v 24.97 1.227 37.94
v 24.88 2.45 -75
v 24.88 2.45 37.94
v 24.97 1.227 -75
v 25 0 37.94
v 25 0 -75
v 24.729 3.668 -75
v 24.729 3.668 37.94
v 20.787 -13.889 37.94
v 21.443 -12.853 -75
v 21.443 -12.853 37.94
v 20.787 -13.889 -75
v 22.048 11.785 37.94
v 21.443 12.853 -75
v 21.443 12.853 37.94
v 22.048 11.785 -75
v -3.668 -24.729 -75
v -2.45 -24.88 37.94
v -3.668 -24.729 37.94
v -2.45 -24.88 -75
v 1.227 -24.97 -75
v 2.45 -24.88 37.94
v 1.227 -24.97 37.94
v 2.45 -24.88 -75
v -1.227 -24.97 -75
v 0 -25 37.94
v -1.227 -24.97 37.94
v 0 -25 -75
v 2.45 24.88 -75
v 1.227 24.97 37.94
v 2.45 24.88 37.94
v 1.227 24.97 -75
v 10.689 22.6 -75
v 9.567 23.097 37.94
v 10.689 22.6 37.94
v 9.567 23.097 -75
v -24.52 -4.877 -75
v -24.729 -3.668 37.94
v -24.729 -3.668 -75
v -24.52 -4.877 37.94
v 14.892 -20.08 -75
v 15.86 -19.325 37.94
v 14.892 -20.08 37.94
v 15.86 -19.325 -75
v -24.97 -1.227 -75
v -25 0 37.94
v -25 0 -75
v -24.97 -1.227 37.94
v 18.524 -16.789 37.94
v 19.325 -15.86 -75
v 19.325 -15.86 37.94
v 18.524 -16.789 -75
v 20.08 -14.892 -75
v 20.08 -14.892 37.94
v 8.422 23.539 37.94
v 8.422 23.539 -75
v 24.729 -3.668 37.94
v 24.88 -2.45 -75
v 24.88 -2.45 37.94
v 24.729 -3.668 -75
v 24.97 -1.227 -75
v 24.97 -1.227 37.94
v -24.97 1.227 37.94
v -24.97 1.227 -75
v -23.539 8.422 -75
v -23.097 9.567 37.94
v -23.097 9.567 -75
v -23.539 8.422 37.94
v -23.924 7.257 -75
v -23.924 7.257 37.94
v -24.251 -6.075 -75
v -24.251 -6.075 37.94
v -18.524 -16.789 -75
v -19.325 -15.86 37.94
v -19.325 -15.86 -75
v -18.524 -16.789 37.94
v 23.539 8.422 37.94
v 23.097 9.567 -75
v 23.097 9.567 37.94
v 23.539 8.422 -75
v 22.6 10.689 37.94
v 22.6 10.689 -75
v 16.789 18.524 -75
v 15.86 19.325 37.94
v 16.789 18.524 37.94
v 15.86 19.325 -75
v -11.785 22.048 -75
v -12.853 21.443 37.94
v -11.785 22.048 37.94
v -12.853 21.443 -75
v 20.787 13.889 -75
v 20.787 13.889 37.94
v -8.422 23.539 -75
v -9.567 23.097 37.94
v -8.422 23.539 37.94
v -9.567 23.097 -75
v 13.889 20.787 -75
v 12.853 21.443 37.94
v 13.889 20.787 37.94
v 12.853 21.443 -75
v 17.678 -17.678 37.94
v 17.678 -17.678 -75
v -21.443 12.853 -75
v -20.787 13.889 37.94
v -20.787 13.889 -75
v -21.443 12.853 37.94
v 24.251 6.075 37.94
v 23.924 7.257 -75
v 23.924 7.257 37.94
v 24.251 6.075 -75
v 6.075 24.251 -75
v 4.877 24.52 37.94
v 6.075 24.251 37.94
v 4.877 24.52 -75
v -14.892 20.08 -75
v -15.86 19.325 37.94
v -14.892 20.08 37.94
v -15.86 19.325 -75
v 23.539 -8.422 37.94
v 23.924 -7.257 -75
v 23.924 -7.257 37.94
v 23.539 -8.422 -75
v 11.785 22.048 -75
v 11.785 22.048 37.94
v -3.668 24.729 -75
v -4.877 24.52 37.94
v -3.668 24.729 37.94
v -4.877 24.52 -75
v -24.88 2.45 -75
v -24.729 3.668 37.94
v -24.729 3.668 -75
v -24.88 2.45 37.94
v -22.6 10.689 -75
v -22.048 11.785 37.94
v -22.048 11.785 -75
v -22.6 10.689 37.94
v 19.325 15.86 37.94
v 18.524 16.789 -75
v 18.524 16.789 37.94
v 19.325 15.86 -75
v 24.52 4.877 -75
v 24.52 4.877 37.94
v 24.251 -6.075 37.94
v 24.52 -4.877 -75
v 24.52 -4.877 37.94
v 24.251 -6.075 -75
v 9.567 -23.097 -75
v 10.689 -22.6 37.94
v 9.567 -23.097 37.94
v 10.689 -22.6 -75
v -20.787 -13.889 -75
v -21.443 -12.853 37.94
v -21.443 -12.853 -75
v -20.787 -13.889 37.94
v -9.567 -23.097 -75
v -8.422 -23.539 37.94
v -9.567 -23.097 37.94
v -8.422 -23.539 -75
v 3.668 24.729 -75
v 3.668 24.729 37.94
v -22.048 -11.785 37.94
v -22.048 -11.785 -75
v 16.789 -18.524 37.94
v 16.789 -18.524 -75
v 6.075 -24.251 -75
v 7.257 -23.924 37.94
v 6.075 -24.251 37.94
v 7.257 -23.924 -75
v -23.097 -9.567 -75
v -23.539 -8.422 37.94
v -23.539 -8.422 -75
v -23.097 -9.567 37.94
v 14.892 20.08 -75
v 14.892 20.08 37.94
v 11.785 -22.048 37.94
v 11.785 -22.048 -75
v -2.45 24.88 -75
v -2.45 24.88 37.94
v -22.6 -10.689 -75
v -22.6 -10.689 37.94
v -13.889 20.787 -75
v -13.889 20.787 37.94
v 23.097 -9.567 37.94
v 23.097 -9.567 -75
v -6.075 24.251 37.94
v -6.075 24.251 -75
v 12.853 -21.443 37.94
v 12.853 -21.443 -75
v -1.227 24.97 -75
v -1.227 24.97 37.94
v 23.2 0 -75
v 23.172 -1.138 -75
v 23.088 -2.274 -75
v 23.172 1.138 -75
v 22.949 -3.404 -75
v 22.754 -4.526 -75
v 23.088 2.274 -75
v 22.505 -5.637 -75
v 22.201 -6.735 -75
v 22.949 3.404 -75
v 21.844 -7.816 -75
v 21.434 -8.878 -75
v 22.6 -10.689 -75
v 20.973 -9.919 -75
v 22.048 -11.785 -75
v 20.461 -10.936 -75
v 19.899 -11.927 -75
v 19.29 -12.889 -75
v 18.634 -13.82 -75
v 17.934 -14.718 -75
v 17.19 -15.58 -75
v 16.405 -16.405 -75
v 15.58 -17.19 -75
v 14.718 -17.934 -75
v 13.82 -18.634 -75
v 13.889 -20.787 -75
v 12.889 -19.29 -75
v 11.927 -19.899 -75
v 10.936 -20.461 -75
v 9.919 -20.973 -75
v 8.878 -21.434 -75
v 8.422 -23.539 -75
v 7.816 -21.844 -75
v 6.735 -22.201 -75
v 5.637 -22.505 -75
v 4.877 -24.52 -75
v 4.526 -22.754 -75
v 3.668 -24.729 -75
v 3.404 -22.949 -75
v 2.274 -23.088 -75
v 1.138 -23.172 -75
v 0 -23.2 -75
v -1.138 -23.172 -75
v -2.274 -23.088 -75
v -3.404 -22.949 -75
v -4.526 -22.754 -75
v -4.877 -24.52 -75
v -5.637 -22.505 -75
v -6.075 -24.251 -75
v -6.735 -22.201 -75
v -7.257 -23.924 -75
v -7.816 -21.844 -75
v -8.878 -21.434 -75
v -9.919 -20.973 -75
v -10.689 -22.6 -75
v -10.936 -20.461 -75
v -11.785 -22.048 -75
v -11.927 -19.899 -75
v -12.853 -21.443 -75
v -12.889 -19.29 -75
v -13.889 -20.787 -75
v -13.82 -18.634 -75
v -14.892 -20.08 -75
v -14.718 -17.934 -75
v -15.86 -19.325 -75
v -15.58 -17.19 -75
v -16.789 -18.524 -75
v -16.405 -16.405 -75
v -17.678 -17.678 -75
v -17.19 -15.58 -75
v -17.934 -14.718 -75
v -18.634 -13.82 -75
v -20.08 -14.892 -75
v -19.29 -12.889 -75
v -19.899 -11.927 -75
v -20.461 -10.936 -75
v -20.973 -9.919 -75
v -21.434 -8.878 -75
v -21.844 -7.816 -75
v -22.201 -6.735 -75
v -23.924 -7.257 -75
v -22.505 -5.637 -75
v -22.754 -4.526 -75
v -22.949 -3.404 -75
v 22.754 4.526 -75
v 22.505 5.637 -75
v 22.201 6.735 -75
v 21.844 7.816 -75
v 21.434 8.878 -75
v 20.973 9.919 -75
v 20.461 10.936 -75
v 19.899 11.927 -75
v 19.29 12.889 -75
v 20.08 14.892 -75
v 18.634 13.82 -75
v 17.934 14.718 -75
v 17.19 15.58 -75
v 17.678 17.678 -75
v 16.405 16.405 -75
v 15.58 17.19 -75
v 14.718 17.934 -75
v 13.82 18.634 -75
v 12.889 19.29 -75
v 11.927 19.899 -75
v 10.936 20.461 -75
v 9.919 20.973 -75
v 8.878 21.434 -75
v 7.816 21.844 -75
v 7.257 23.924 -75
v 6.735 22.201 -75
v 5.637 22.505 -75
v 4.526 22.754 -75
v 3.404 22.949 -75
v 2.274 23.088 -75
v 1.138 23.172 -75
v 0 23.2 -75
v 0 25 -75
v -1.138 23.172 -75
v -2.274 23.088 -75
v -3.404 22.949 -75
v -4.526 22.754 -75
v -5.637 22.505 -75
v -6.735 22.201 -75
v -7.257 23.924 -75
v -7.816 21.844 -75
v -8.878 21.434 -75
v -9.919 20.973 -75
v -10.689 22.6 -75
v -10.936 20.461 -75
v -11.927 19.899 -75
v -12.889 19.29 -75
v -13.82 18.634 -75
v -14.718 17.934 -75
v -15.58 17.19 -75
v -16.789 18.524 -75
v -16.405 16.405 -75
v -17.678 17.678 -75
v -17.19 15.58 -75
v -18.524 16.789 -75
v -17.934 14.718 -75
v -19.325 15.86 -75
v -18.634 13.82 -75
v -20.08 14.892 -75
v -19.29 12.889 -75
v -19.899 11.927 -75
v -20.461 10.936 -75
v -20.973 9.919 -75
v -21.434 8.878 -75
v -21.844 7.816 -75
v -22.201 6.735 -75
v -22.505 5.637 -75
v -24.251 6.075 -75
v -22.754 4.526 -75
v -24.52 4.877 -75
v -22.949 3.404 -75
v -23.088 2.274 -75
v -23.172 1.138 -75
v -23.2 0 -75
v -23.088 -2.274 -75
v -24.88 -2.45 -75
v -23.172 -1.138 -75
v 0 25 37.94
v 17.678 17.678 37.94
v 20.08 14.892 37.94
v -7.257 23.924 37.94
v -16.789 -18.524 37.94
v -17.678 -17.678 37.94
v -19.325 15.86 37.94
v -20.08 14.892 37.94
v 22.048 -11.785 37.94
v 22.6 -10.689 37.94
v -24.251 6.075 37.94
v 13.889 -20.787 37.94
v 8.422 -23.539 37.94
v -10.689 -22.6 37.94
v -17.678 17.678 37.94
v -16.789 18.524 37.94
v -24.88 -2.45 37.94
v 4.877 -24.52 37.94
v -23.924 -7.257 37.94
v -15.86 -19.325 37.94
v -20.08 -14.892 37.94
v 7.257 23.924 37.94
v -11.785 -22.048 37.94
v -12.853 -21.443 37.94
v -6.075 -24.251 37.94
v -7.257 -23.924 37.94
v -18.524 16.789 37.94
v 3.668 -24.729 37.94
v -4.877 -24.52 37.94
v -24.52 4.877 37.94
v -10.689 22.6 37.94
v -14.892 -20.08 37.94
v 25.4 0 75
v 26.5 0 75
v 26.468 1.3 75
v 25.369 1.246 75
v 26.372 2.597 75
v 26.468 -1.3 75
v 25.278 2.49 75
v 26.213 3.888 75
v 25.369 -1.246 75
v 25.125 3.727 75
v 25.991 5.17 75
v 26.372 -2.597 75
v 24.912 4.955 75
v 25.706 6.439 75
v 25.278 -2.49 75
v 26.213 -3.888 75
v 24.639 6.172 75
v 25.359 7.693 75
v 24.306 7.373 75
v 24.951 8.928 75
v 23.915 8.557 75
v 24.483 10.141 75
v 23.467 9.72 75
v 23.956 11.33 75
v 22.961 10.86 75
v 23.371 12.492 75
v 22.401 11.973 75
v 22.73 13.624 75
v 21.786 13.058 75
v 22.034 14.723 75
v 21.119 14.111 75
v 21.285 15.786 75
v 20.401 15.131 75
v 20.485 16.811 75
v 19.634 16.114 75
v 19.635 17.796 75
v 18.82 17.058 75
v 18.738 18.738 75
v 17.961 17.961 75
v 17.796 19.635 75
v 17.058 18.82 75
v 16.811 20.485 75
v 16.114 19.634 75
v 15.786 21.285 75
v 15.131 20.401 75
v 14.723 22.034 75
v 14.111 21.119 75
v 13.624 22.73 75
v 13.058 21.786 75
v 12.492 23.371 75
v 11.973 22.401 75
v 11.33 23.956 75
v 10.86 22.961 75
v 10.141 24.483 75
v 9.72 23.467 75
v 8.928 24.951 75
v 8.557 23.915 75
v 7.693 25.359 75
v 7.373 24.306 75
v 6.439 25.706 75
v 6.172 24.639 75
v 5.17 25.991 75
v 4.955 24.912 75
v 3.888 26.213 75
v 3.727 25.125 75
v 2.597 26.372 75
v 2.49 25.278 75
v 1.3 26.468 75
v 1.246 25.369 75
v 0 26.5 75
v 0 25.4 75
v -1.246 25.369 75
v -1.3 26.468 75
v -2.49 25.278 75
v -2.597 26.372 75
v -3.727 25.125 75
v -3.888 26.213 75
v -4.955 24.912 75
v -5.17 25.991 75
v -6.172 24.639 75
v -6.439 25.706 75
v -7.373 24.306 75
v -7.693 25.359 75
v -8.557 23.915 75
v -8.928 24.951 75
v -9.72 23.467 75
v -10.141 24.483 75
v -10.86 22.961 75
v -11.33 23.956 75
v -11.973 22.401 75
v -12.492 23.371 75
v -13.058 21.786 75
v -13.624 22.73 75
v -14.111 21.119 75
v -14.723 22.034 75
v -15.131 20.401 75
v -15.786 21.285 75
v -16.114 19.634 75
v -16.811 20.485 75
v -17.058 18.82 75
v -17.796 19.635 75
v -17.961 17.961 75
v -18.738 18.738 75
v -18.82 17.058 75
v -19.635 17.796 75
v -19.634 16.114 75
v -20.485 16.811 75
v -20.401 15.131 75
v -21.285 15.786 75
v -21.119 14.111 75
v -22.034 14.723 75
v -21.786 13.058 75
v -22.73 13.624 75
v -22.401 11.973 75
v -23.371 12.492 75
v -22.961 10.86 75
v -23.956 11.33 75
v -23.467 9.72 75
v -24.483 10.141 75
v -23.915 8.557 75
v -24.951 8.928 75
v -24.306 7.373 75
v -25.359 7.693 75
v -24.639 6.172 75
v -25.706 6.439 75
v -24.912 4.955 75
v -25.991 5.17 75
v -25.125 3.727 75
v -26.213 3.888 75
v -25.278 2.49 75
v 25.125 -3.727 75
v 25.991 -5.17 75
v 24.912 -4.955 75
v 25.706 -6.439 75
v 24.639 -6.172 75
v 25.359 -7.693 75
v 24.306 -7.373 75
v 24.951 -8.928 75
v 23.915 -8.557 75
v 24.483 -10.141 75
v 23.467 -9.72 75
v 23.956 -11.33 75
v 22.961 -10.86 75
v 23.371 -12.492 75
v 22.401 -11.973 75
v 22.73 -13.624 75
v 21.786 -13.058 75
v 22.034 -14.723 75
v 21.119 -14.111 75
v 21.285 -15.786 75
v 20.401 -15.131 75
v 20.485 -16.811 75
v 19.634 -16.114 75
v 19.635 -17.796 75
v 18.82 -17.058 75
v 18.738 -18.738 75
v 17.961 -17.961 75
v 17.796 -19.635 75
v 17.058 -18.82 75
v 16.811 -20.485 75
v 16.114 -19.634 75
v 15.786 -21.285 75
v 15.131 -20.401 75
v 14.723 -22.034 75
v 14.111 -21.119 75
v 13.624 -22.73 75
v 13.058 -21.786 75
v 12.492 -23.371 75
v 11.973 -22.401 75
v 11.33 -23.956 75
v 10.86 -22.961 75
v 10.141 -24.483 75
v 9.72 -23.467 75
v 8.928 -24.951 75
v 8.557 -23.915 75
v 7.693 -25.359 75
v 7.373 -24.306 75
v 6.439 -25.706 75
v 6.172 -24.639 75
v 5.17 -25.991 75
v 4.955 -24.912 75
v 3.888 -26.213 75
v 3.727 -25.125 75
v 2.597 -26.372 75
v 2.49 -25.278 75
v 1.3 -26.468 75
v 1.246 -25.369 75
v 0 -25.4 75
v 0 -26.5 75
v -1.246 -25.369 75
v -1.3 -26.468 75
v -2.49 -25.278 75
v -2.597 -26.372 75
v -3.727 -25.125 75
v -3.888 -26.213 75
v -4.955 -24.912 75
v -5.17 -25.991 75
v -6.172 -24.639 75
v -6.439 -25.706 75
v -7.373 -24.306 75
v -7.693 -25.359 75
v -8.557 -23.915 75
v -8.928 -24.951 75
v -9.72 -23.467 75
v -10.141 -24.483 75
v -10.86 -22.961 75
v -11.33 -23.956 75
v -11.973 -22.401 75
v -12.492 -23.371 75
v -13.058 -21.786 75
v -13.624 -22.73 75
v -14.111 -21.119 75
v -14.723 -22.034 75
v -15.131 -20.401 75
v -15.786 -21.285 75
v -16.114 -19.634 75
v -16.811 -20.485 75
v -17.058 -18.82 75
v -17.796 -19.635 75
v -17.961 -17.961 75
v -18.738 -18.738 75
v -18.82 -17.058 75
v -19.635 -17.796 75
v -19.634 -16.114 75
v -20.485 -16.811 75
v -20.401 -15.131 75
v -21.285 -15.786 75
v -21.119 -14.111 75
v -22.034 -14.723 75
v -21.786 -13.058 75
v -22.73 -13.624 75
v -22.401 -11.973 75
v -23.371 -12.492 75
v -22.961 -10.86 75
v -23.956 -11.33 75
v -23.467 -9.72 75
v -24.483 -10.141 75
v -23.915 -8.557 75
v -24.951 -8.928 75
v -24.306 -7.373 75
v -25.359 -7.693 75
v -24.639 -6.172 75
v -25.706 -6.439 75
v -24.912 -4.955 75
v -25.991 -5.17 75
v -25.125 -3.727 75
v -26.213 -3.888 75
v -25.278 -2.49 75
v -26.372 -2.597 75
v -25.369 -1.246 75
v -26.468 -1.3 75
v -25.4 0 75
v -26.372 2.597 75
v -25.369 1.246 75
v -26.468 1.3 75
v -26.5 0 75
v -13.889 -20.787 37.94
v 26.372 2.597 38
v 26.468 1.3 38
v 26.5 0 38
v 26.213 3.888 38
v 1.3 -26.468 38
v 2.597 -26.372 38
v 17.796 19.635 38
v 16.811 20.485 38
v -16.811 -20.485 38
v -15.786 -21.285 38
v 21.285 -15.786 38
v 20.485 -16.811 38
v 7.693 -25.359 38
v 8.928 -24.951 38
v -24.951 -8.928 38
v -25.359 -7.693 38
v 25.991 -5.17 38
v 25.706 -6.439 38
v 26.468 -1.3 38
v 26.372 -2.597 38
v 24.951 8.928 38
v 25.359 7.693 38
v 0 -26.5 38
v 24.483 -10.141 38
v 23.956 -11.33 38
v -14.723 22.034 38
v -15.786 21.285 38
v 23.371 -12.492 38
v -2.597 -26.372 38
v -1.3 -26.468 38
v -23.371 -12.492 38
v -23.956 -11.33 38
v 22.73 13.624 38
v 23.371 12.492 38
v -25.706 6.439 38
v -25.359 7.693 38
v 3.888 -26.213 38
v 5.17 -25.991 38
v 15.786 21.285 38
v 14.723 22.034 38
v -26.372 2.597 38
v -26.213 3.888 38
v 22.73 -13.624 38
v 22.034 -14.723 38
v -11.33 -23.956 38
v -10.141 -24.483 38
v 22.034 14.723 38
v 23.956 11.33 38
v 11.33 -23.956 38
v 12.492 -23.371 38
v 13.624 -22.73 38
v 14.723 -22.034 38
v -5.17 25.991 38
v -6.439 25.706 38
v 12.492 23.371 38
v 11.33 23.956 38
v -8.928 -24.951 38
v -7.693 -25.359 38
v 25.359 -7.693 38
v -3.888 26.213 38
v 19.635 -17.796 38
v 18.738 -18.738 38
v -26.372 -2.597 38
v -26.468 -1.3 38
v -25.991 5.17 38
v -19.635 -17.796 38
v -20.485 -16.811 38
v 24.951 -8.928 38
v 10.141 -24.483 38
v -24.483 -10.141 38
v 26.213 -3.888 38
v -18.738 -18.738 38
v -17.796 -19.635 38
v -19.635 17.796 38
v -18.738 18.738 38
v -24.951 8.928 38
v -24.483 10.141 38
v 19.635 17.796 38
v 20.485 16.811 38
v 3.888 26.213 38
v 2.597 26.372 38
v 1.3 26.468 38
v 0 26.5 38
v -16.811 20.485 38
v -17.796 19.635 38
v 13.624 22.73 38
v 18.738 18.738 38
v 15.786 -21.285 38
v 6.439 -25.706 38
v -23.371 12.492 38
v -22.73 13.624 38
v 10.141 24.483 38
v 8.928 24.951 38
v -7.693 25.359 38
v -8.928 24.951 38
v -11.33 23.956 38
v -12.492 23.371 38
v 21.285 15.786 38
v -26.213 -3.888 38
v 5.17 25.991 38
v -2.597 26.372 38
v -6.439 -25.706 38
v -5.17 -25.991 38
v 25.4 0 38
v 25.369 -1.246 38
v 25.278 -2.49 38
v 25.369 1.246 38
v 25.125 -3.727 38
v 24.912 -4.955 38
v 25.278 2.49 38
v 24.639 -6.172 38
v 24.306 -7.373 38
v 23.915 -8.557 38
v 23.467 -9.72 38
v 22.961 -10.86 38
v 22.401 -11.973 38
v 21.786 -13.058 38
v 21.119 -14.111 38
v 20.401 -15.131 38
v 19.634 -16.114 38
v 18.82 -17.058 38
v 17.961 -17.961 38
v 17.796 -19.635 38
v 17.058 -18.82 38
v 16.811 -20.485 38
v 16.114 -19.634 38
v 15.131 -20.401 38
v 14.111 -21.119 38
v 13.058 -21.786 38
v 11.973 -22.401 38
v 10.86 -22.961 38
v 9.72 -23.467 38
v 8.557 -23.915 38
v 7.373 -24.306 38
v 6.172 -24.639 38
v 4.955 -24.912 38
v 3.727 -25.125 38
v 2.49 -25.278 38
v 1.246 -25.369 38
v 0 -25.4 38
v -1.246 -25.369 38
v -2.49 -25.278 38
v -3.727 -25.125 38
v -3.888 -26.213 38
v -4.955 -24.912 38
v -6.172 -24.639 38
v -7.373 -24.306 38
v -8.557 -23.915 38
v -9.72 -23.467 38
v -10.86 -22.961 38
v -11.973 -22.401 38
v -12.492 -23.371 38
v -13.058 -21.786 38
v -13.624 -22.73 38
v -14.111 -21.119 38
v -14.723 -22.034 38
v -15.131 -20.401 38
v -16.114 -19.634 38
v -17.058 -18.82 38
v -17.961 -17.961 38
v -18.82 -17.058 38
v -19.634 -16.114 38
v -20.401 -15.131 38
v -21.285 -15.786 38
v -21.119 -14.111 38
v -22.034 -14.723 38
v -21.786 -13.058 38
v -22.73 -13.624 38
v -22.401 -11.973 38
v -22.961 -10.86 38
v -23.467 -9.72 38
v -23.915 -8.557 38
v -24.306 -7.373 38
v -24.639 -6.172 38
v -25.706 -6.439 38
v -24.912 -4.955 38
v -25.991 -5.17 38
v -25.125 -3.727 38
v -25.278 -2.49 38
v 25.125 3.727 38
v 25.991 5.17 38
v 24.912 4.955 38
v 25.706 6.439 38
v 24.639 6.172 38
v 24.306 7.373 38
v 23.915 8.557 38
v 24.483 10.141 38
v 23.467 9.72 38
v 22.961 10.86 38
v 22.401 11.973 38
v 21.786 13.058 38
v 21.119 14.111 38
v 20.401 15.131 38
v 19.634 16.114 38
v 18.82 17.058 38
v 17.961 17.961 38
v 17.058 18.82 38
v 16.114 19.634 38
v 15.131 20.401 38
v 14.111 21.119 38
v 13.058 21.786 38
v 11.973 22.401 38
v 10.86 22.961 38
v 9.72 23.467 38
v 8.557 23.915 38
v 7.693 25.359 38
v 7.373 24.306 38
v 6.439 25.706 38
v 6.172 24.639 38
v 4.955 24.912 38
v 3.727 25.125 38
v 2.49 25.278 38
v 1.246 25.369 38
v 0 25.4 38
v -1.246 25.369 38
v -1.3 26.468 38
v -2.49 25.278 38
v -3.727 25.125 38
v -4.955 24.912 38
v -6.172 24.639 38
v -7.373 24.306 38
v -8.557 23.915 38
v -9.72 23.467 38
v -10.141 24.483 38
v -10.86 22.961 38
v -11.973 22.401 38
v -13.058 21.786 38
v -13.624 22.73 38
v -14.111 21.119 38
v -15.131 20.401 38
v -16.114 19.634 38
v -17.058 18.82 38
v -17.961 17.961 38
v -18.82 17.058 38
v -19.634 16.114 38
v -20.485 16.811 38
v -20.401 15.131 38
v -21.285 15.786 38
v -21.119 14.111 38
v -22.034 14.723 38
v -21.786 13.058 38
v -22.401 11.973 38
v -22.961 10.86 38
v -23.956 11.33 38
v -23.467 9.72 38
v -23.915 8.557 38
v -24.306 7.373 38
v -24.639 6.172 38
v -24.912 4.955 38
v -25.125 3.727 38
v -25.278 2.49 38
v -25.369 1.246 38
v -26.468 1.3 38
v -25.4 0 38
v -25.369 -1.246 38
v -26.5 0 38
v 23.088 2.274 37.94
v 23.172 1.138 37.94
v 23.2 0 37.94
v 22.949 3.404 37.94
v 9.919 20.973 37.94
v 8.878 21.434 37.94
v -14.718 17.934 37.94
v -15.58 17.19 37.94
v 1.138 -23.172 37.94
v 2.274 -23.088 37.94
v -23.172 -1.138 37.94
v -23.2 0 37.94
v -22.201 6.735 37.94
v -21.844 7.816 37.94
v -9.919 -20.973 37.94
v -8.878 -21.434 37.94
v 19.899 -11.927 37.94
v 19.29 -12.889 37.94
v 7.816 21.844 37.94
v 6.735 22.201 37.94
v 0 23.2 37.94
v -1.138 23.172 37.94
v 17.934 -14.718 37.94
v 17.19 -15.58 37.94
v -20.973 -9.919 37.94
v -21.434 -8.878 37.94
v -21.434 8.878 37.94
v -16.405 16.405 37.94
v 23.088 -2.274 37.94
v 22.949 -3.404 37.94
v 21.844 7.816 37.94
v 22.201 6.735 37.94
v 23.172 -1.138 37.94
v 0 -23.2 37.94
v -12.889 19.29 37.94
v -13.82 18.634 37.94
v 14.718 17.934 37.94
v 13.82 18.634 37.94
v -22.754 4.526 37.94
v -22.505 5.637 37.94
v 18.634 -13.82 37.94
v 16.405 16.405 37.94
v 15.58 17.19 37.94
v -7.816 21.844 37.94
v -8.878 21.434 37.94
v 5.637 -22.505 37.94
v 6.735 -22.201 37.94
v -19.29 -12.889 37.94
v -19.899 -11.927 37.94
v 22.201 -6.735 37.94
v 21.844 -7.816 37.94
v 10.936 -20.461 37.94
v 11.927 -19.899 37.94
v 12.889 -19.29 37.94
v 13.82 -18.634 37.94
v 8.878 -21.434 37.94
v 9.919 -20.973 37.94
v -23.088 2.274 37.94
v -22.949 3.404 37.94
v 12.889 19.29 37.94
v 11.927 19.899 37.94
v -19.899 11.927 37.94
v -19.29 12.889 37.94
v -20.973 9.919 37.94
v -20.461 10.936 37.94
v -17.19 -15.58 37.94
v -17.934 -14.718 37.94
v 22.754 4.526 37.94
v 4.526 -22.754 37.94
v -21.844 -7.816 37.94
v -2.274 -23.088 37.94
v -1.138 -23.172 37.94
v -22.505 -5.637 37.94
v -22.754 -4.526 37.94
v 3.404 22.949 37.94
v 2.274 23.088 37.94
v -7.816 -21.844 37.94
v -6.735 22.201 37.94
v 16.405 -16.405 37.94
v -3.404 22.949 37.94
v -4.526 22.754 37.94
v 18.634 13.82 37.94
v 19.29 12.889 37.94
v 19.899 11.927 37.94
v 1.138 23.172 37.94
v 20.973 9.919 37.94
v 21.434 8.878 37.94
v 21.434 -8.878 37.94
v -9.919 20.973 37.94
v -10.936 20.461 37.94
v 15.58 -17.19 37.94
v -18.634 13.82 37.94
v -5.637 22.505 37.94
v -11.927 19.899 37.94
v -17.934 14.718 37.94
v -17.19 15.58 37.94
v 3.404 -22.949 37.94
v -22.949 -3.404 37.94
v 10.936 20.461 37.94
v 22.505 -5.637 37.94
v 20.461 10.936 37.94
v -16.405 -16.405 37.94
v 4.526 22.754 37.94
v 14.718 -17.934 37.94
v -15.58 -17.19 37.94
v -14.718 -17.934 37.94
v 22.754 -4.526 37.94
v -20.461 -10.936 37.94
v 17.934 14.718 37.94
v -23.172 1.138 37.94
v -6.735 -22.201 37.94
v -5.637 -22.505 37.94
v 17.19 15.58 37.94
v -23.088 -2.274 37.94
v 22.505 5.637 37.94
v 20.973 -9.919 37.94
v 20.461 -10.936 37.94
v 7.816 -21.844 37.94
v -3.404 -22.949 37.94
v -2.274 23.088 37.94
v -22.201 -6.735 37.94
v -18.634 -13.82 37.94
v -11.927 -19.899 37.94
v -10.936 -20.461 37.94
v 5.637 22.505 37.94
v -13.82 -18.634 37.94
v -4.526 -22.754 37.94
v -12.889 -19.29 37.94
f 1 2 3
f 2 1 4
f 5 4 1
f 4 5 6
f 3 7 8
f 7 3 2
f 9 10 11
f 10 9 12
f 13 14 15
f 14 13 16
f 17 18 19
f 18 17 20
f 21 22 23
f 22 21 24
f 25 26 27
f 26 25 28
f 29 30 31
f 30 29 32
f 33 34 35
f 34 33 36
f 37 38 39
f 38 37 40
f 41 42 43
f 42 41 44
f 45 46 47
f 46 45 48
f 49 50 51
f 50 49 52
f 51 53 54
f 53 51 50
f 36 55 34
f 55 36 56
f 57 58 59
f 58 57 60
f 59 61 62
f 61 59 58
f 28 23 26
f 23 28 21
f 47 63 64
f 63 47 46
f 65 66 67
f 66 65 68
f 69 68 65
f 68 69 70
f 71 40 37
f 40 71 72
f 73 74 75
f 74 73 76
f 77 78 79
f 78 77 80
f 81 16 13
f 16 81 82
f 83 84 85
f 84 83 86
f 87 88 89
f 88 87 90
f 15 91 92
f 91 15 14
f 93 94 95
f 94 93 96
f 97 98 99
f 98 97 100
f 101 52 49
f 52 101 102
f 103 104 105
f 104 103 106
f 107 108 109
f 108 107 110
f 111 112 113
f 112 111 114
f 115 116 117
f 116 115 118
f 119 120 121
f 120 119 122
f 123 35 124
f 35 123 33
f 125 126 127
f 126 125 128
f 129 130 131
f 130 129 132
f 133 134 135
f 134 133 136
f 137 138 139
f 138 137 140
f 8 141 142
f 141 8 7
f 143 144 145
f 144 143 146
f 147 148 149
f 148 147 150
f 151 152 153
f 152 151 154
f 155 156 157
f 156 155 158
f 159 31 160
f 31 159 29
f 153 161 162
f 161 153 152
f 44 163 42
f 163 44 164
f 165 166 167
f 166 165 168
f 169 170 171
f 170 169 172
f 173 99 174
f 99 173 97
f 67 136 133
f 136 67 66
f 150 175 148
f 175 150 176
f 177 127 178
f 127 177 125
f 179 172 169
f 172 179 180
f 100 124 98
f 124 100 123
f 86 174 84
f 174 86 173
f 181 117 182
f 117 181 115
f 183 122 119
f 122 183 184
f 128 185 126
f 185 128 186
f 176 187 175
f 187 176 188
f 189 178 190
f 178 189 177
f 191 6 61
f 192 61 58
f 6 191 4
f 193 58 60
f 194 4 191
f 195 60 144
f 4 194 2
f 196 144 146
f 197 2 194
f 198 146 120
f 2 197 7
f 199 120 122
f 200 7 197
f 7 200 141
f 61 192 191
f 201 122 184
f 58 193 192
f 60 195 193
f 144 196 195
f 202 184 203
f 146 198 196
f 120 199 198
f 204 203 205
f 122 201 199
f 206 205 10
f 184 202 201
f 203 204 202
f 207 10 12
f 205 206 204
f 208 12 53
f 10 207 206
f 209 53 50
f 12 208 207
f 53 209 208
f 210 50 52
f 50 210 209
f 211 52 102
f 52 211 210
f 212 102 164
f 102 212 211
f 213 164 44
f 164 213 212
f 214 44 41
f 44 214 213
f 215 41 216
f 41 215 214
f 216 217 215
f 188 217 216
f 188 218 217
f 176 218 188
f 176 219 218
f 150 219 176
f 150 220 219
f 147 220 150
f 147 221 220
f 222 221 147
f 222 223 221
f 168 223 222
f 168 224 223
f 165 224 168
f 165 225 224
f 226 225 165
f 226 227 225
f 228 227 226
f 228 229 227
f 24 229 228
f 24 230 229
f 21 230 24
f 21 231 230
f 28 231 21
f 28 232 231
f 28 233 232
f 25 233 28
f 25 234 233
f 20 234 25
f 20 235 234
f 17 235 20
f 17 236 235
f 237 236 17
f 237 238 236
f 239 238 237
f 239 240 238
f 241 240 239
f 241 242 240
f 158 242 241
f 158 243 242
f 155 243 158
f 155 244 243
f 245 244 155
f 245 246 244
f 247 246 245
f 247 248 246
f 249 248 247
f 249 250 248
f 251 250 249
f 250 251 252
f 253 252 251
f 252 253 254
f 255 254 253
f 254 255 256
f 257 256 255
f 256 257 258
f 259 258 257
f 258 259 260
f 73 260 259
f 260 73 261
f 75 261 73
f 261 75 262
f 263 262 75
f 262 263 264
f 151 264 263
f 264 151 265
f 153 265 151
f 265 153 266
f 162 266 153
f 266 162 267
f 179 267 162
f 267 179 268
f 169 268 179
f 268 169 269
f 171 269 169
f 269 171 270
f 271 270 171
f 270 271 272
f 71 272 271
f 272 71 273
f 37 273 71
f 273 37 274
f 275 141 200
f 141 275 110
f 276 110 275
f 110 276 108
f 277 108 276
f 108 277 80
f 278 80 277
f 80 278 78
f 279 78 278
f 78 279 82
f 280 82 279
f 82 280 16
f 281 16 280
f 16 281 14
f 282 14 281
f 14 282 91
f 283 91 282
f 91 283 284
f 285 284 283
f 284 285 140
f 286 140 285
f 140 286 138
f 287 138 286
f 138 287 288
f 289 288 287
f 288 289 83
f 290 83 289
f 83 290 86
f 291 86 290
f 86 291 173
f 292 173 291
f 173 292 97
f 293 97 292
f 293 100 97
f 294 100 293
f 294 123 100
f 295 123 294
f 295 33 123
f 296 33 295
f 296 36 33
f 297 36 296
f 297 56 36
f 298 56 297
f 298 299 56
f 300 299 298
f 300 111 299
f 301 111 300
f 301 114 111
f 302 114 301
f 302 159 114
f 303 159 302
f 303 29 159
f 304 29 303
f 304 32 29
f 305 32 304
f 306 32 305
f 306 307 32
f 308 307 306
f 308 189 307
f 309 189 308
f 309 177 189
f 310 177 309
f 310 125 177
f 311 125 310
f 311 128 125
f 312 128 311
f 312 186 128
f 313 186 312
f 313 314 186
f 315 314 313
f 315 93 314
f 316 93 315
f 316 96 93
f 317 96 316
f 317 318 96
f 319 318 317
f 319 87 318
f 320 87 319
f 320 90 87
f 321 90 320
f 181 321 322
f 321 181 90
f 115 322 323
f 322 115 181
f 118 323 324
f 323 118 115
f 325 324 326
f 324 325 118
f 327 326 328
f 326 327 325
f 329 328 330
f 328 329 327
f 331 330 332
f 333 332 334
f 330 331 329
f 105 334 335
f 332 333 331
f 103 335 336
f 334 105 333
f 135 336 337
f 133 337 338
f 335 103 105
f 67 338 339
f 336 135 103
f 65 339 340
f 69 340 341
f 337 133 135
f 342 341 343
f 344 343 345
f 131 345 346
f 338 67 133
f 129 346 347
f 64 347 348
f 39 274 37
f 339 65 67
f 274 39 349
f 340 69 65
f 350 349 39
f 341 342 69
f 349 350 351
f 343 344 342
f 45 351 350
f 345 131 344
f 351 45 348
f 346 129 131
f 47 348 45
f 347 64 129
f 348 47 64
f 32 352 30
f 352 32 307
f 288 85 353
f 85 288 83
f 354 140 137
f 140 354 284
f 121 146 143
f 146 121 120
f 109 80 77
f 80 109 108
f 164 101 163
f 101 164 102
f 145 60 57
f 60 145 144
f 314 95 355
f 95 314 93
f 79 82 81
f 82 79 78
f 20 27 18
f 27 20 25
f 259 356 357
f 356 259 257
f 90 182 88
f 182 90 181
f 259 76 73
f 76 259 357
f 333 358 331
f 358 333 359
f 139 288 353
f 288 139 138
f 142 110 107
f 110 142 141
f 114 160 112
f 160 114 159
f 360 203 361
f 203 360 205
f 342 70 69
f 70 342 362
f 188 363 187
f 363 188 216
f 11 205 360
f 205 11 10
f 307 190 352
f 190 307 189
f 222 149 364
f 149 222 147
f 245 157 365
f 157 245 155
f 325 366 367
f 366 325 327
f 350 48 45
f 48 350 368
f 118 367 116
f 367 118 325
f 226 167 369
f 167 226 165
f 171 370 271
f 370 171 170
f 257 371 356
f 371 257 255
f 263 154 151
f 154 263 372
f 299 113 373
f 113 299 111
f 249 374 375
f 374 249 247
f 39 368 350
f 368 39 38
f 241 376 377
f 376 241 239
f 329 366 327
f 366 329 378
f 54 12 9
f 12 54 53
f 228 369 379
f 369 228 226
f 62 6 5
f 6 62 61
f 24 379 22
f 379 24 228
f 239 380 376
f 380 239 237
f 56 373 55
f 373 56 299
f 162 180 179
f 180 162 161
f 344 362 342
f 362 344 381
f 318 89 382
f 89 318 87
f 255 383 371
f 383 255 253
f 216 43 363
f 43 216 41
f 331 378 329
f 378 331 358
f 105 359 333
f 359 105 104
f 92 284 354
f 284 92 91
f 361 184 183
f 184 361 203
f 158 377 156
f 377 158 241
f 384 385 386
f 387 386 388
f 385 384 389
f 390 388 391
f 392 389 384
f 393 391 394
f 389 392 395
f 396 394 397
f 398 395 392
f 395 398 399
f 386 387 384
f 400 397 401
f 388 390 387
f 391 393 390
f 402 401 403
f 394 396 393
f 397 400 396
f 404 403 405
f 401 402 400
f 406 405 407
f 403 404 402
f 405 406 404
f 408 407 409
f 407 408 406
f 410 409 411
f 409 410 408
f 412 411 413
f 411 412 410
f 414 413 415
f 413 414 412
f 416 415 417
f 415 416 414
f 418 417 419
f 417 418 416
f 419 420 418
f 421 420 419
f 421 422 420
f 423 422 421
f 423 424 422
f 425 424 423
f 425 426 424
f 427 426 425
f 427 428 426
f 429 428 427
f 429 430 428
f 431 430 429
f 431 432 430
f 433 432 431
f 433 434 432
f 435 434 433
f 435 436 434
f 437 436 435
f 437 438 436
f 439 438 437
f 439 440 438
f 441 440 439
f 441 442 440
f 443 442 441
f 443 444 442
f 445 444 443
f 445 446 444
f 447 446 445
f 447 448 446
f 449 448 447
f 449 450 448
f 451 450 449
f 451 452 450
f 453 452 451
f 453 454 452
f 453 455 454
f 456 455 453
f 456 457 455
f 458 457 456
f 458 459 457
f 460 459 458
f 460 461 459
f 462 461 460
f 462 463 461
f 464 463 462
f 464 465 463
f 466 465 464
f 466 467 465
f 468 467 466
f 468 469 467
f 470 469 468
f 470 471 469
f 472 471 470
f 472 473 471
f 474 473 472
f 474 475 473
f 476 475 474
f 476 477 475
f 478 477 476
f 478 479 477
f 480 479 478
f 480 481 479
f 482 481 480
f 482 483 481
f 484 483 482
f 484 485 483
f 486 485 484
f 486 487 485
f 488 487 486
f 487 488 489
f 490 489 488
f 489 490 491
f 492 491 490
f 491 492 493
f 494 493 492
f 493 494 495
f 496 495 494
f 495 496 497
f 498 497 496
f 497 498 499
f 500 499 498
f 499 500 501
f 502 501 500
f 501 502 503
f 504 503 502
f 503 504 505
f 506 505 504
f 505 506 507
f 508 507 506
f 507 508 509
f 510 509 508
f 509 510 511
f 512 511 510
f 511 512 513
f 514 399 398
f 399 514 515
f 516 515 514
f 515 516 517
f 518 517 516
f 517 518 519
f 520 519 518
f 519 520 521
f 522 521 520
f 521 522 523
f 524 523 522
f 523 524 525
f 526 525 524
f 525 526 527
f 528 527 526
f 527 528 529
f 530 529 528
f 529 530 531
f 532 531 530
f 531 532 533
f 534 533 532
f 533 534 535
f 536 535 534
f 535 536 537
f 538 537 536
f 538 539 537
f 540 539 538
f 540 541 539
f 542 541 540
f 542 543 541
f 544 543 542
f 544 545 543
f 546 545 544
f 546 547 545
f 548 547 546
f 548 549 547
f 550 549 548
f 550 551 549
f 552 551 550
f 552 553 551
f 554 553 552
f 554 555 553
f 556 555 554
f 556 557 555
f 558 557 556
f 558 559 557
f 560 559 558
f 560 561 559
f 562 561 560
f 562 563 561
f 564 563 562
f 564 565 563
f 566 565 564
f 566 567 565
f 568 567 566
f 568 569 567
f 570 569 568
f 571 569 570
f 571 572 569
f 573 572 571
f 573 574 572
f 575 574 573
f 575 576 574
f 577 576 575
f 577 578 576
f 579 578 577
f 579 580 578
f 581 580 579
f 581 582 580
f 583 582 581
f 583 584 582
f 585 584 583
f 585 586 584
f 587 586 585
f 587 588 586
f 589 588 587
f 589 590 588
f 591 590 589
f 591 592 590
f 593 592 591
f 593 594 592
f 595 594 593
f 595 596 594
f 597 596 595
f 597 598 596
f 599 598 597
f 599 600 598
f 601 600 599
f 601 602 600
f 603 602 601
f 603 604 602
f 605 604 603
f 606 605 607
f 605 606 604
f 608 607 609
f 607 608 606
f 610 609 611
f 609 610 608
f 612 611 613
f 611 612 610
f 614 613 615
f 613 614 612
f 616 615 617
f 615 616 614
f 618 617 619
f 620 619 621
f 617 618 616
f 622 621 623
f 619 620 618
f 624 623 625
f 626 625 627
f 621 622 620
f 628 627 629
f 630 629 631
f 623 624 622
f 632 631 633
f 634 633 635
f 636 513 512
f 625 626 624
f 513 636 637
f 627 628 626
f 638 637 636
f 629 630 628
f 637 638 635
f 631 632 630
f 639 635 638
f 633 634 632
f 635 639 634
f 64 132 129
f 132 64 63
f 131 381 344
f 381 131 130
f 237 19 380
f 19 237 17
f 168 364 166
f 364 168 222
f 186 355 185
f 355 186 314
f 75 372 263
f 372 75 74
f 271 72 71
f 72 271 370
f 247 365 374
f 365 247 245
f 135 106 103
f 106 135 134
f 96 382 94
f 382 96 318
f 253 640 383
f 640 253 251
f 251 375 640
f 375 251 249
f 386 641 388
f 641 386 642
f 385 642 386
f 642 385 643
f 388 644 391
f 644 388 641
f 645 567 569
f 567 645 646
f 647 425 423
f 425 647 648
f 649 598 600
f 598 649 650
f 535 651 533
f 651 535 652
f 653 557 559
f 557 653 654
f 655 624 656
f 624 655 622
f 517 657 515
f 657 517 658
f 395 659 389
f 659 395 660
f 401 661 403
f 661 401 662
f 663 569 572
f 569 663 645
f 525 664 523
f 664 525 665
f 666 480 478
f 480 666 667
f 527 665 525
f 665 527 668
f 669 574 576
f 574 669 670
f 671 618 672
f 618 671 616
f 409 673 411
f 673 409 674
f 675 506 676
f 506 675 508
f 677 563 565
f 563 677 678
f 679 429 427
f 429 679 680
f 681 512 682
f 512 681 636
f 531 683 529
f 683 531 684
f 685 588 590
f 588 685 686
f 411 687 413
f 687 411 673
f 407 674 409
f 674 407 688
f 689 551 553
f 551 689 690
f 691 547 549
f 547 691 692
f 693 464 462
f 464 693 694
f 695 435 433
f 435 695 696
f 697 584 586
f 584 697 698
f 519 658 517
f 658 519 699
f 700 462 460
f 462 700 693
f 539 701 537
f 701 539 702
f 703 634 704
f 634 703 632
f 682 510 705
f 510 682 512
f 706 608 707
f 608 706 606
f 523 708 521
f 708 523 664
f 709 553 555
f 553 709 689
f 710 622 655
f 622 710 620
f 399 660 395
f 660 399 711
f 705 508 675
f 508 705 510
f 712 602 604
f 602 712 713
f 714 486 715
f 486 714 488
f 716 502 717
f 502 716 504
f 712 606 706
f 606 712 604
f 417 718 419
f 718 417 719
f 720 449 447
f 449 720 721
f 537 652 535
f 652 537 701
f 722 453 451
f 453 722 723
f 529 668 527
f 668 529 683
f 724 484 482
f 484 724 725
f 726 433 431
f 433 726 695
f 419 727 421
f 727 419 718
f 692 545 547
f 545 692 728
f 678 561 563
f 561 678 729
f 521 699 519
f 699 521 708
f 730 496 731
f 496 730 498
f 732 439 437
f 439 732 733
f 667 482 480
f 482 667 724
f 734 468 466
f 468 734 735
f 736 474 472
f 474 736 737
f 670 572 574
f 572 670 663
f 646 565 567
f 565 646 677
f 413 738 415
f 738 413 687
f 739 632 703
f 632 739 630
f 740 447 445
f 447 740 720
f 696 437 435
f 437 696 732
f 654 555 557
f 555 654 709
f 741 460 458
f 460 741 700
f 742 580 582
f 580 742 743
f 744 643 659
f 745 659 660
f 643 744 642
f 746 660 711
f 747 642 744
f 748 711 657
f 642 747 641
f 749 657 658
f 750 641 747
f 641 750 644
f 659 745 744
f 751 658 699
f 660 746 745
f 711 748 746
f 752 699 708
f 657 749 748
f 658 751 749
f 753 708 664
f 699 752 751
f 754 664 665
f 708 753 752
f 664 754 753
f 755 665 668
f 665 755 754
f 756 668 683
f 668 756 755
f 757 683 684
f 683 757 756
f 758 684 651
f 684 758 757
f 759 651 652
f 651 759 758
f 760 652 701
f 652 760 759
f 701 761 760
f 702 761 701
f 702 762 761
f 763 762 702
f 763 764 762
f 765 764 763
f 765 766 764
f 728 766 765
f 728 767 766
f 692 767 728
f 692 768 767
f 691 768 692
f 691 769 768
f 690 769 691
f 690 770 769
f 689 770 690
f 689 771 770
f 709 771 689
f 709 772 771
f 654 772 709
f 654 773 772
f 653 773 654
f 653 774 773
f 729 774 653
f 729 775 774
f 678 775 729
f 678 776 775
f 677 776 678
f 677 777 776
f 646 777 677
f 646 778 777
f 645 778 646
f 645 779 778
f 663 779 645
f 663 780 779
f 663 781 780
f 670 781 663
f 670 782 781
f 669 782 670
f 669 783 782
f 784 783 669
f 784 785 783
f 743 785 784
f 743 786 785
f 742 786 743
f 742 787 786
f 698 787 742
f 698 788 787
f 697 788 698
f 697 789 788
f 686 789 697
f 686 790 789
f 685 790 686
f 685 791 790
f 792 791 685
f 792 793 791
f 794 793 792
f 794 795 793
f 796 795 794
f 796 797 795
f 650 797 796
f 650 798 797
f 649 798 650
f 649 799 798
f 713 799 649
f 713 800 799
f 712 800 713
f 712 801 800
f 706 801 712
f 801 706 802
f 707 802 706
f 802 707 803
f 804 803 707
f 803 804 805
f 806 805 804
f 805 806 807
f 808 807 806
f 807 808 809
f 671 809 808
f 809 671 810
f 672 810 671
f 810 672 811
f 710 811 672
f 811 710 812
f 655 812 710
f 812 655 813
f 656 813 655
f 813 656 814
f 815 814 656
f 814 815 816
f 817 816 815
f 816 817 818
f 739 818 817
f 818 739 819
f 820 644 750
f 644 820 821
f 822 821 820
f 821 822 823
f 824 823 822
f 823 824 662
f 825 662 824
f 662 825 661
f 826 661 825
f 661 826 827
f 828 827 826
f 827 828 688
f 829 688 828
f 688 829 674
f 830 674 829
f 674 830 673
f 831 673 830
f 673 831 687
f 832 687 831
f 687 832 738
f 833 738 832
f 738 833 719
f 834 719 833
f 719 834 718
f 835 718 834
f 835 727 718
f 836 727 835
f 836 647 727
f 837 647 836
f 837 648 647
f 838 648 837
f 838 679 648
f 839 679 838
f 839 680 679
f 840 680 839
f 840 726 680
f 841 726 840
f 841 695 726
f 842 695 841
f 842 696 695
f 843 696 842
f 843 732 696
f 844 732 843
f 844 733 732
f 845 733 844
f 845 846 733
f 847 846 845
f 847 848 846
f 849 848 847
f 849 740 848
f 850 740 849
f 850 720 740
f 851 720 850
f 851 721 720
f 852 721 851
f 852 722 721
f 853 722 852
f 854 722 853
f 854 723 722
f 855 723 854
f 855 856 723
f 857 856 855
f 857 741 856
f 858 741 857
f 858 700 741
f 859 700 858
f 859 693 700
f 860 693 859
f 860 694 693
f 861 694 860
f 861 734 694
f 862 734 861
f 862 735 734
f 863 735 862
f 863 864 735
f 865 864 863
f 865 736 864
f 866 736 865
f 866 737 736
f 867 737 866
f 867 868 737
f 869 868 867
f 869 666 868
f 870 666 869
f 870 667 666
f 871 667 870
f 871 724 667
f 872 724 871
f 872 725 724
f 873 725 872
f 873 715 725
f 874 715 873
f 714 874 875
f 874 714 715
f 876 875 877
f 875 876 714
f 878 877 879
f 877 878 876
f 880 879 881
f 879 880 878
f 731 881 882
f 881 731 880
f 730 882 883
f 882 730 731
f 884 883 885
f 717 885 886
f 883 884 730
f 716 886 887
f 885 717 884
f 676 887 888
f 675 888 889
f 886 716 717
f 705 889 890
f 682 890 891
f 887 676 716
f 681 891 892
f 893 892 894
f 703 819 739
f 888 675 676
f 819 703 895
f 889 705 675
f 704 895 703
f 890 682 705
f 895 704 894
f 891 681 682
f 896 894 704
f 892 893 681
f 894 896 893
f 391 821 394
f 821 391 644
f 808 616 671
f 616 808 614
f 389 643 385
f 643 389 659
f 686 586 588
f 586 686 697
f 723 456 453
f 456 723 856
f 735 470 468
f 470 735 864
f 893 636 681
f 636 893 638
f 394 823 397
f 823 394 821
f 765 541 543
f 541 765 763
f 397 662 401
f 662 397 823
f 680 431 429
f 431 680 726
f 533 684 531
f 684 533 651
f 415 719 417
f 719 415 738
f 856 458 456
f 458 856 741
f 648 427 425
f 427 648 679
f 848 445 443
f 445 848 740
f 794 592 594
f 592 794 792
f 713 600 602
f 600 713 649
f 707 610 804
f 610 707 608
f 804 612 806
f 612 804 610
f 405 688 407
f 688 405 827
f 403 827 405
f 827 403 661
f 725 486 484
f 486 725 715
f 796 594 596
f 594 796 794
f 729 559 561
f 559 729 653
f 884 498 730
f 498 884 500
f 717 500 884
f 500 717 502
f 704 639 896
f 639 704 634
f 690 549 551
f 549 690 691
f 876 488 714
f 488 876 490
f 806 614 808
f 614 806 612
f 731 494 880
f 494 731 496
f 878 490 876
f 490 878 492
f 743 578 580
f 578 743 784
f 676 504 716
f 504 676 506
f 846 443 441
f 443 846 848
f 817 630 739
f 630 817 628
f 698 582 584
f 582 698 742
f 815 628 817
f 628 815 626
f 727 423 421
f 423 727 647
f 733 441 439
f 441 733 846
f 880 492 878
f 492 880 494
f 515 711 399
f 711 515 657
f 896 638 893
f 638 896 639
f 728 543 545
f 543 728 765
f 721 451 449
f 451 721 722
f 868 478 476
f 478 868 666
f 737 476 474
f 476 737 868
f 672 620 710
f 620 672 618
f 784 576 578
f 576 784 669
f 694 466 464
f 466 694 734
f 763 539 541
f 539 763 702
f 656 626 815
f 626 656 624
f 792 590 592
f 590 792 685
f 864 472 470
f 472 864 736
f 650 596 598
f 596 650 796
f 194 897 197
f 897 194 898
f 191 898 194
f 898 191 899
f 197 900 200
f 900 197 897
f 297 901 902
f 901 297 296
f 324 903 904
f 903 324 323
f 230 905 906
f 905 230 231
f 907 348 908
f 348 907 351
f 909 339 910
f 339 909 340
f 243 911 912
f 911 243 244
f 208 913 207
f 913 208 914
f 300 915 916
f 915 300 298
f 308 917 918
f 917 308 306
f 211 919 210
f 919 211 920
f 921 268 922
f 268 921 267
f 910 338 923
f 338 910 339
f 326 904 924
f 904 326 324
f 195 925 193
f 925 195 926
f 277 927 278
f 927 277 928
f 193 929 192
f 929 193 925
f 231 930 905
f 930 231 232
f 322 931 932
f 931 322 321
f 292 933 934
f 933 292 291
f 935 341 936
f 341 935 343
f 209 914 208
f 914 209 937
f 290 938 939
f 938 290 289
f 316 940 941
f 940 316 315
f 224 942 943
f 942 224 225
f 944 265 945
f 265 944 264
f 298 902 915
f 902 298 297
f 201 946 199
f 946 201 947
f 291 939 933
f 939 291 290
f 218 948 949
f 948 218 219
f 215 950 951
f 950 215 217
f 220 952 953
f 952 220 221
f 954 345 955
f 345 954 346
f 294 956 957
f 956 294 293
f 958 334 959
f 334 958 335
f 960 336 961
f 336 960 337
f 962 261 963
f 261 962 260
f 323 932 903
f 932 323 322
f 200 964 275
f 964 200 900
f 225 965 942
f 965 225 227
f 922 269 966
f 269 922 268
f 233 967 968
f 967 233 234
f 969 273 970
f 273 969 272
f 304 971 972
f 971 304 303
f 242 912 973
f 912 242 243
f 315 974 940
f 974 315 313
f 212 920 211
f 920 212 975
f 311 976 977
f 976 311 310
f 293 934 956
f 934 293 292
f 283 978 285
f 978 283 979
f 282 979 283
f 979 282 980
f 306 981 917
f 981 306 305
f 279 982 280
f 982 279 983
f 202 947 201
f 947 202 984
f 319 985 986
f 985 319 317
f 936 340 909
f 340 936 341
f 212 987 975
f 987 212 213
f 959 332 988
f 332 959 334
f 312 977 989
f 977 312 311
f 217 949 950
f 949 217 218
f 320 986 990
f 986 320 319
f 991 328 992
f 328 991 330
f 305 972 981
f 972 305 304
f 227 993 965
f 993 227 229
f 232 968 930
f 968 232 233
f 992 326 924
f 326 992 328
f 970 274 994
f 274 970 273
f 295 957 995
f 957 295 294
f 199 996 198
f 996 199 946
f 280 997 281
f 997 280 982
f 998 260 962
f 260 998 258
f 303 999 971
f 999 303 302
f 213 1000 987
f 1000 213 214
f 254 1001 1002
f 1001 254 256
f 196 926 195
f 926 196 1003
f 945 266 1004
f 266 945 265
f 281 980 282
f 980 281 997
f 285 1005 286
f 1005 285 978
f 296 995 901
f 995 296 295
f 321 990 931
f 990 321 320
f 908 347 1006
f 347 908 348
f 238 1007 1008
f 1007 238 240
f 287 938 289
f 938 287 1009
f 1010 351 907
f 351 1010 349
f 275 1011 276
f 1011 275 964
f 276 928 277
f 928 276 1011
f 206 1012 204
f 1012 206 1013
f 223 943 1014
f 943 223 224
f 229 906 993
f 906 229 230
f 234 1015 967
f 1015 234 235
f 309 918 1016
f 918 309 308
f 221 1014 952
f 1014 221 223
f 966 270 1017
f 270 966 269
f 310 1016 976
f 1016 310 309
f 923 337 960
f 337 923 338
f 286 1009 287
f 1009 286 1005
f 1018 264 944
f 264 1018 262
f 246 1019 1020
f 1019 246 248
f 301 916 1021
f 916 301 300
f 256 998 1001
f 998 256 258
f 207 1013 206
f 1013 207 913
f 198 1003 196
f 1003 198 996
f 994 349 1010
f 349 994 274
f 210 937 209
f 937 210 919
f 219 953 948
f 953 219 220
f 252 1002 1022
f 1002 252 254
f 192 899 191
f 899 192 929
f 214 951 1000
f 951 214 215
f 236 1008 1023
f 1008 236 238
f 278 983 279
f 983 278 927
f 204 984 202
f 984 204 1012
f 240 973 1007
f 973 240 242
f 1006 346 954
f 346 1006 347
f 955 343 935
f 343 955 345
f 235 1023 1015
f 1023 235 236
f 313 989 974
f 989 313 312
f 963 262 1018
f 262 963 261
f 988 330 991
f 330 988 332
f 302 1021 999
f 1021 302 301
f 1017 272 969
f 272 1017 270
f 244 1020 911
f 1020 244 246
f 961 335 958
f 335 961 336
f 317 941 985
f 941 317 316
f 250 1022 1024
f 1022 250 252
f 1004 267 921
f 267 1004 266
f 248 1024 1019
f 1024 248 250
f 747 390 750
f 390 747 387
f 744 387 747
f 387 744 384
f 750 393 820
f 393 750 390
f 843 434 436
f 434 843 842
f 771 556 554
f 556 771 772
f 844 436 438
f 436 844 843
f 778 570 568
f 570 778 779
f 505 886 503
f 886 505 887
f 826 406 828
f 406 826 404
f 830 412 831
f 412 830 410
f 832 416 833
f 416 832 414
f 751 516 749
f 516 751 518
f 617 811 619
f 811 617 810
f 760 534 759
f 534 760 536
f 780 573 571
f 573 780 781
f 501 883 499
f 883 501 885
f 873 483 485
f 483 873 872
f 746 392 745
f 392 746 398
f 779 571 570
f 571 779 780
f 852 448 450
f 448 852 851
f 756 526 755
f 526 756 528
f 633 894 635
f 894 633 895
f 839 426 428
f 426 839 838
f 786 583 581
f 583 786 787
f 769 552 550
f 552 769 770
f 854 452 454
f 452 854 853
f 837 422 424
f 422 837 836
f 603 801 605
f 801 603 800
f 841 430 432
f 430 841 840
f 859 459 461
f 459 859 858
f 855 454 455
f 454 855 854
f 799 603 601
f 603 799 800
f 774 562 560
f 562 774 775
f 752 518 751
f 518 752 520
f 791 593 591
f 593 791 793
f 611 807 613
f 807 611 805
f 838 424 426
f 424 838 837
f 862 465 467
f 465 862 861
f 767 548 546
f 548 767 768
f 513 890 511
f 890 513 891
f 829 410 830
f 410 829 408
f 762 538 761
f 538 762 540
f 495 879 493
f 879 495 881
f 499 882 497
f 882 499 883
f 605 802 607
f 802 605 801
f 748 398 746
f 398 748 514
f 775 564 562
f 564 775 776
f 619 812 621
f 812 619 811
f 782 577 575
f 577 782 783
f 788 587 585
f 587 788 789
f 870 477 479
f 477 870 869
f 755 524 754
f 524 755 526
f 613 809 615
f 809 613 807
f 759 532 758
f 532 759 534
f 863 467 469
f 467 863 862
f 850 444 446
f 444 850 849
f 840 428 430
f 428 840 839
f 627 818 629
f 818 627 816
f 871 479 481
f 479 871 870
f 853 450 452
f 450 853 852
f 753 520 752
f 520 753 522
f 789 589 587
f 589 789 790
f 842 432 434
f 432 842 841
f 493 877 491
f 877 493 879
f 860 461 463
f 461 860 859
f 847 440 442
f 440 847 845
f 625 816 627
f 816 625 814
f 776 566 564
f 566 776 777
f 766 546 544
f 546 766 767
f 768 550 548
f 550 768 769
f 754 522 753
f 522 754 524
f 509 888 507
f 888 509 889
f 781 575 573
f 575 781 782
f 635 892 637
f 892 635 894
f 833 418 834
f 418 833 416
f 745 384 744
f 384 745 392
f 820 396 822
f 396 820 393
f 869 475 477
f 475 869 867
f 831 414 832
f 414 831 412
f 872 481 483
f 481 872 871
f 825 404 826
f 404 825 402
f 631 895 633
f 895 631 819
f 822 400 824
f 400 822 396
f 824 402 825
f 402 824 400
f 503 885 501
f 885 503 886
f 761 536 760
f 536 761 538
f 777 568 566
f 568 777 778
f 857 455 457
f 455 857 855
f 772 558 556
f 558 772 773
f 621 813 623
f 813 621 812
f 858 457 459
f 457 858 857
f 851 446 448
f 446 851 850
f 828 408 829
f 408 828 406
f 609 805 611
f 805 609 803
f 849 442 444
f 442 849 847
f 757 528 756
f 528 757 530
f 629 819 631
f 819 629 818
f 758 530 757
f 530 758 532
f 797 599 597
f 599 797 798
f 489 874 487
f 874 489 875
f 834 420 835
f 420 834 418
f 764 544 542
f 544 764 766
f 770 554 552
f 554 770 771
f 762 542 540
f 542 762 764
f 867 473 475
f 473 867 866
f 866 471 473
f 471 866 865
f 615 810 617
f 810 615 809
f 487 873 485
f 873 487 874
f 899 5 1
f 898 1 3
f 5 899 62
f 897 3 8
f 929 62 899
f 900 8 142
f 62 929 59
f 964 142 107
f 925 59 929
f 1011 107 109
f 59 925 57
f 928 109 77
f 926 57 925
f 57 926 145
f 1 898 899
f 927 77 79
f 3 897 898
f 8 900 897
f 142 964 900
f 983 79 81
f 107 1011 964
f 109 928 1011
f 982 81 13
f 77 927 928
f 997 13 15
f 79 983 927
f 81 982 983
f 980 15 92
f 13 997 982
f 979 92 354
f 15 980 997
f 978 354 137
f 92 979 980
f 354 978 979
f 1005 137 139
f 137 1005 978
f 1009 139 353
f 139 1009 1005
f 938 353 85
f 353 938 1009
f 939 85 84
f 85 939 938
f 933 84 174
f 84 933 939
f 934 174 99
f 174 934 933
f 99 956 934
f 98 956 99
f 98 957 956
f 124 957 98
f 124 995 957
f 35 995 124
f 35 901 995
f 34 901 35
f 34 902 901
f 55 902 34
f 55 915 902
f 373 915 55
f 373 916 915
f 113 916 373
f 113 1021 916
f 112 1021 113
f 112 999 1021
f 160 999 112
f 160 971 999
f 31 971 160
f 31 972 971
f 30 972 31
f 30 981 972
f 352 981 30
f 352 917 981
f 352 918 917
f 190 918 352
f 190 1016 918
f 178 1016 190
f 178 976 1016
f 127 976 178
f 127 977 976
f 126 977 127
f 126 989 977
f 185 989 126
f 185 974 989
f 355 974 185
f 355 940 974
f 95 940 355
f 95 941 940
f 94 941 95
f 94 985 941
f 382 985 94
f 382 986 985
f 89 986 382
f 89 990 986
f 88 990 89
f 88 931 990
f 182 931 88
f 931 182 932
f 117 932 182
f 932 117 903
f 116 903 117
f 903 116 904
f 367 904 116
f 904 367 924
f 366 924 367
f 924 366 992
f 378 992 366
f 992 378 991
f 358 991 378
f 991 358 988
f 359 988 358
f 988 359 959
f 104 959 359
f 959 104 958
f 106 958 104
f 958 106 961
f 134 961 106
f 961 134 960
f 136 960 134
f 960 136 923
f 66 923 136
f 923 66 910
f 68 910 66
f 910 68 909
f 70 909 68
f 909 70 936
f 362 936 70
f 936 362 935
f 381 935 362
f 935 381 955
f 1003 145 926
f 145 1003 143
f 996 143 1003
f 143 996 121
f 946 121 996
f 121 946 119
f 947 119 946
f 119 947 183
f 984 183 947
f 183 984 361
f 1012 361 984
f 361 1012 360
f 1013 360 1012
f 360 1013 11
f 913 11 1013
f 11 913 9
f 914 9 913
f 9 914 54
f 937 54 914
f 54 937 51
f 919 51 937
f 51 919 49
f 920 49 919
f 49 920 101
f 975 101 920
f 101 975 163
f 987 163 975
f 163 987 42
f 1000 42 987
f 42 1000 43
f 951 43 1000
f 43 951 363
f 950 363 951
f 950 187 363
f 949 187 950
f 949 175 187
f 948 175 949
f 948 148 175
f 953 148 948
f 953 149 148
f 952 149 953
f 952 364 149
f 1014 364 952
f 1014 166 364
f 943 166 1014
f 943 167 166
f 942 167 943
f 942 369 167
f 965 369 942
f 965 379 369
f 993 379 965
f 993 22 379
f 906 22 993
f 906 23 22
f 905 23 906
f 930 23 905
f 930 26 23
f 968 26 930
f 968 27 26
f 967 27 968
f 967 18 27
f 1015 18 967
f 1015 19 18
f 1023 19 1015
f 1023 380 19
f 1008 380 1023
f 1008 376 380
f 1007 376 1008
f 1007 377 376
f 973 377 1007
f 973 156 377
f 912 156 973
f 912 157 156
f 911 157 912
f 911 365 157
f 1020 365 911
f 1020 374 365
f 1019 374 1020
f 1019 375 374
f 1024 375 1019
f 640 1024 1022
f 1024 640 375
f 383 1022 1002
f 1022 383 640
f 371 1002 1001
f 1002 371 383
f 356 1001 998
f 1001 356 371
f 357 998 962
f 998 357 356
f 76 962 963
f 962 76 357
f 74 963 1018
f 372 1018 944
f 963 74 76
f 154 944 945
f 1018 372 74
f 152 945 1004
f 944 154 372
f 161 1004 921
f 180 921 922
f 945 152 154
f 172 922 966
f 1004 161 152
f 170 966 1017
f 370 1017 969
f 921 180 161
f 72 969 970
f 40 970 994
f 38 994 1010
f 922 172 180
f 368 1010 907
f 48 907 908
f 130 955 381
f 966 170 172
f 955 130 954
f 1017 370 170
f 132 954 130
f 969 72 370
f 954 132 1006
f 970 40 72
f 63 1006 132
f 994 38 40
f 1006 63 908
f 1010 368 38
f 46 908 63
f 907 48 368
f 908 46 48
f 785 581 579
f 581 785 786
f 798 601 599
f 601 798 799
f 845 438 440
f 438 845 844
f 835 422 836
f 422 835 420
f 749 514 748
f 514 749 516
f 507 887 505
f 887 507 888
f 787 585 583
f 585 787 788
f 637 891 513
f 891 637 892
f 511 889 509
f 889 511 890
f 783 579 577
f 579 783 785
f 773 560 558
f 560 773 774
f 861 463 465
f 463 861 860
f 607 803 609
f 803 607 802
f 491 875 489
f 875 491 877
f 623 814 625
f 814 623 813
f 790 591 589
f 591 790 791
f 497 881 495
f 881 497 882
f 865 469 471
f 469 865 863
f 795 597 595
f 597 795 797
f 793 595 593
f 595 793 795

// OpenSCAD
$fn = 128;

// Parameters (HT 50 pipe 150 mm)
nominal_diameter = 50;
length_mm = 150;
od_mm = 50;
wall_mm = 1.8;

socket_length_mm = 35;
socket_wall_extra_mm = 1.5;
socket_id_clearance_mm = 0.4;

overlap_mm = 2;          // 1-2mm overlap to guarantee union
eps = 0.02;              // epsilon to avoid coplanar faces

module ht_pipe() {
    outer_r = od_mm/2;
    inner_r = max(0.01, outer_r - wall_mm);

    socket_outer_r = outer_r + socket_wall_extra_mm;
    socket_inner_r = outer_r + socket_id_clearance_mm;

    // Main pipe spans z = [-L/2, +L/2]
    // Socket must be physically attached: overlap into main body by overlap_mm.
    // Place socket so its TOP is flush with main top (+L/2) and it extends DOWN by (socket_length + overlap).
    socket_h = socket_length_mm + overlap_mm;

    // Explicitly compute socket top/bottom to guarantee intersection with main body
    main_top_z =  length_mm/2;
    socket_top_z = main_top_z;
    socket_bottom_z = socket_top_z - socket_h;                 // extends down into main by overlap
    socket_center_z = (socket_top_z + socket_bottom_z) / 2;

    difference() {
        // OUTER: single connected solid (union)
        union() {
            // Main outer
            cylinder(h=length_mm, r=outer_r, center=true);

            // Upper sleeve/collar (socket) outer - overlaps into main body by overlap_mm
            translate([0, 0, socket_center_z])
                cylinder(h=socket_h, r=socket_outer_r, center=true);
        }

        // INNER: bores (extend slightly to ensure clean subtraction)
        union() {
            // Main inner bore
            cylinder(h=length_mm + 2*eps, r=inner_r, center=true);

            // Socket inner bore:
            // Make it slightly longer AND push it slightly downward so it fully opens the socket
            // and avoids any tiny "seam" ring from coplanar faces at the socket bottom.
            translate([0, 0, socket_center_z - eps])
                cylinder(h=socket_h + 4*eps, r=socket_inner_r, center=true);
        }
    }
}

ht_pipe();
